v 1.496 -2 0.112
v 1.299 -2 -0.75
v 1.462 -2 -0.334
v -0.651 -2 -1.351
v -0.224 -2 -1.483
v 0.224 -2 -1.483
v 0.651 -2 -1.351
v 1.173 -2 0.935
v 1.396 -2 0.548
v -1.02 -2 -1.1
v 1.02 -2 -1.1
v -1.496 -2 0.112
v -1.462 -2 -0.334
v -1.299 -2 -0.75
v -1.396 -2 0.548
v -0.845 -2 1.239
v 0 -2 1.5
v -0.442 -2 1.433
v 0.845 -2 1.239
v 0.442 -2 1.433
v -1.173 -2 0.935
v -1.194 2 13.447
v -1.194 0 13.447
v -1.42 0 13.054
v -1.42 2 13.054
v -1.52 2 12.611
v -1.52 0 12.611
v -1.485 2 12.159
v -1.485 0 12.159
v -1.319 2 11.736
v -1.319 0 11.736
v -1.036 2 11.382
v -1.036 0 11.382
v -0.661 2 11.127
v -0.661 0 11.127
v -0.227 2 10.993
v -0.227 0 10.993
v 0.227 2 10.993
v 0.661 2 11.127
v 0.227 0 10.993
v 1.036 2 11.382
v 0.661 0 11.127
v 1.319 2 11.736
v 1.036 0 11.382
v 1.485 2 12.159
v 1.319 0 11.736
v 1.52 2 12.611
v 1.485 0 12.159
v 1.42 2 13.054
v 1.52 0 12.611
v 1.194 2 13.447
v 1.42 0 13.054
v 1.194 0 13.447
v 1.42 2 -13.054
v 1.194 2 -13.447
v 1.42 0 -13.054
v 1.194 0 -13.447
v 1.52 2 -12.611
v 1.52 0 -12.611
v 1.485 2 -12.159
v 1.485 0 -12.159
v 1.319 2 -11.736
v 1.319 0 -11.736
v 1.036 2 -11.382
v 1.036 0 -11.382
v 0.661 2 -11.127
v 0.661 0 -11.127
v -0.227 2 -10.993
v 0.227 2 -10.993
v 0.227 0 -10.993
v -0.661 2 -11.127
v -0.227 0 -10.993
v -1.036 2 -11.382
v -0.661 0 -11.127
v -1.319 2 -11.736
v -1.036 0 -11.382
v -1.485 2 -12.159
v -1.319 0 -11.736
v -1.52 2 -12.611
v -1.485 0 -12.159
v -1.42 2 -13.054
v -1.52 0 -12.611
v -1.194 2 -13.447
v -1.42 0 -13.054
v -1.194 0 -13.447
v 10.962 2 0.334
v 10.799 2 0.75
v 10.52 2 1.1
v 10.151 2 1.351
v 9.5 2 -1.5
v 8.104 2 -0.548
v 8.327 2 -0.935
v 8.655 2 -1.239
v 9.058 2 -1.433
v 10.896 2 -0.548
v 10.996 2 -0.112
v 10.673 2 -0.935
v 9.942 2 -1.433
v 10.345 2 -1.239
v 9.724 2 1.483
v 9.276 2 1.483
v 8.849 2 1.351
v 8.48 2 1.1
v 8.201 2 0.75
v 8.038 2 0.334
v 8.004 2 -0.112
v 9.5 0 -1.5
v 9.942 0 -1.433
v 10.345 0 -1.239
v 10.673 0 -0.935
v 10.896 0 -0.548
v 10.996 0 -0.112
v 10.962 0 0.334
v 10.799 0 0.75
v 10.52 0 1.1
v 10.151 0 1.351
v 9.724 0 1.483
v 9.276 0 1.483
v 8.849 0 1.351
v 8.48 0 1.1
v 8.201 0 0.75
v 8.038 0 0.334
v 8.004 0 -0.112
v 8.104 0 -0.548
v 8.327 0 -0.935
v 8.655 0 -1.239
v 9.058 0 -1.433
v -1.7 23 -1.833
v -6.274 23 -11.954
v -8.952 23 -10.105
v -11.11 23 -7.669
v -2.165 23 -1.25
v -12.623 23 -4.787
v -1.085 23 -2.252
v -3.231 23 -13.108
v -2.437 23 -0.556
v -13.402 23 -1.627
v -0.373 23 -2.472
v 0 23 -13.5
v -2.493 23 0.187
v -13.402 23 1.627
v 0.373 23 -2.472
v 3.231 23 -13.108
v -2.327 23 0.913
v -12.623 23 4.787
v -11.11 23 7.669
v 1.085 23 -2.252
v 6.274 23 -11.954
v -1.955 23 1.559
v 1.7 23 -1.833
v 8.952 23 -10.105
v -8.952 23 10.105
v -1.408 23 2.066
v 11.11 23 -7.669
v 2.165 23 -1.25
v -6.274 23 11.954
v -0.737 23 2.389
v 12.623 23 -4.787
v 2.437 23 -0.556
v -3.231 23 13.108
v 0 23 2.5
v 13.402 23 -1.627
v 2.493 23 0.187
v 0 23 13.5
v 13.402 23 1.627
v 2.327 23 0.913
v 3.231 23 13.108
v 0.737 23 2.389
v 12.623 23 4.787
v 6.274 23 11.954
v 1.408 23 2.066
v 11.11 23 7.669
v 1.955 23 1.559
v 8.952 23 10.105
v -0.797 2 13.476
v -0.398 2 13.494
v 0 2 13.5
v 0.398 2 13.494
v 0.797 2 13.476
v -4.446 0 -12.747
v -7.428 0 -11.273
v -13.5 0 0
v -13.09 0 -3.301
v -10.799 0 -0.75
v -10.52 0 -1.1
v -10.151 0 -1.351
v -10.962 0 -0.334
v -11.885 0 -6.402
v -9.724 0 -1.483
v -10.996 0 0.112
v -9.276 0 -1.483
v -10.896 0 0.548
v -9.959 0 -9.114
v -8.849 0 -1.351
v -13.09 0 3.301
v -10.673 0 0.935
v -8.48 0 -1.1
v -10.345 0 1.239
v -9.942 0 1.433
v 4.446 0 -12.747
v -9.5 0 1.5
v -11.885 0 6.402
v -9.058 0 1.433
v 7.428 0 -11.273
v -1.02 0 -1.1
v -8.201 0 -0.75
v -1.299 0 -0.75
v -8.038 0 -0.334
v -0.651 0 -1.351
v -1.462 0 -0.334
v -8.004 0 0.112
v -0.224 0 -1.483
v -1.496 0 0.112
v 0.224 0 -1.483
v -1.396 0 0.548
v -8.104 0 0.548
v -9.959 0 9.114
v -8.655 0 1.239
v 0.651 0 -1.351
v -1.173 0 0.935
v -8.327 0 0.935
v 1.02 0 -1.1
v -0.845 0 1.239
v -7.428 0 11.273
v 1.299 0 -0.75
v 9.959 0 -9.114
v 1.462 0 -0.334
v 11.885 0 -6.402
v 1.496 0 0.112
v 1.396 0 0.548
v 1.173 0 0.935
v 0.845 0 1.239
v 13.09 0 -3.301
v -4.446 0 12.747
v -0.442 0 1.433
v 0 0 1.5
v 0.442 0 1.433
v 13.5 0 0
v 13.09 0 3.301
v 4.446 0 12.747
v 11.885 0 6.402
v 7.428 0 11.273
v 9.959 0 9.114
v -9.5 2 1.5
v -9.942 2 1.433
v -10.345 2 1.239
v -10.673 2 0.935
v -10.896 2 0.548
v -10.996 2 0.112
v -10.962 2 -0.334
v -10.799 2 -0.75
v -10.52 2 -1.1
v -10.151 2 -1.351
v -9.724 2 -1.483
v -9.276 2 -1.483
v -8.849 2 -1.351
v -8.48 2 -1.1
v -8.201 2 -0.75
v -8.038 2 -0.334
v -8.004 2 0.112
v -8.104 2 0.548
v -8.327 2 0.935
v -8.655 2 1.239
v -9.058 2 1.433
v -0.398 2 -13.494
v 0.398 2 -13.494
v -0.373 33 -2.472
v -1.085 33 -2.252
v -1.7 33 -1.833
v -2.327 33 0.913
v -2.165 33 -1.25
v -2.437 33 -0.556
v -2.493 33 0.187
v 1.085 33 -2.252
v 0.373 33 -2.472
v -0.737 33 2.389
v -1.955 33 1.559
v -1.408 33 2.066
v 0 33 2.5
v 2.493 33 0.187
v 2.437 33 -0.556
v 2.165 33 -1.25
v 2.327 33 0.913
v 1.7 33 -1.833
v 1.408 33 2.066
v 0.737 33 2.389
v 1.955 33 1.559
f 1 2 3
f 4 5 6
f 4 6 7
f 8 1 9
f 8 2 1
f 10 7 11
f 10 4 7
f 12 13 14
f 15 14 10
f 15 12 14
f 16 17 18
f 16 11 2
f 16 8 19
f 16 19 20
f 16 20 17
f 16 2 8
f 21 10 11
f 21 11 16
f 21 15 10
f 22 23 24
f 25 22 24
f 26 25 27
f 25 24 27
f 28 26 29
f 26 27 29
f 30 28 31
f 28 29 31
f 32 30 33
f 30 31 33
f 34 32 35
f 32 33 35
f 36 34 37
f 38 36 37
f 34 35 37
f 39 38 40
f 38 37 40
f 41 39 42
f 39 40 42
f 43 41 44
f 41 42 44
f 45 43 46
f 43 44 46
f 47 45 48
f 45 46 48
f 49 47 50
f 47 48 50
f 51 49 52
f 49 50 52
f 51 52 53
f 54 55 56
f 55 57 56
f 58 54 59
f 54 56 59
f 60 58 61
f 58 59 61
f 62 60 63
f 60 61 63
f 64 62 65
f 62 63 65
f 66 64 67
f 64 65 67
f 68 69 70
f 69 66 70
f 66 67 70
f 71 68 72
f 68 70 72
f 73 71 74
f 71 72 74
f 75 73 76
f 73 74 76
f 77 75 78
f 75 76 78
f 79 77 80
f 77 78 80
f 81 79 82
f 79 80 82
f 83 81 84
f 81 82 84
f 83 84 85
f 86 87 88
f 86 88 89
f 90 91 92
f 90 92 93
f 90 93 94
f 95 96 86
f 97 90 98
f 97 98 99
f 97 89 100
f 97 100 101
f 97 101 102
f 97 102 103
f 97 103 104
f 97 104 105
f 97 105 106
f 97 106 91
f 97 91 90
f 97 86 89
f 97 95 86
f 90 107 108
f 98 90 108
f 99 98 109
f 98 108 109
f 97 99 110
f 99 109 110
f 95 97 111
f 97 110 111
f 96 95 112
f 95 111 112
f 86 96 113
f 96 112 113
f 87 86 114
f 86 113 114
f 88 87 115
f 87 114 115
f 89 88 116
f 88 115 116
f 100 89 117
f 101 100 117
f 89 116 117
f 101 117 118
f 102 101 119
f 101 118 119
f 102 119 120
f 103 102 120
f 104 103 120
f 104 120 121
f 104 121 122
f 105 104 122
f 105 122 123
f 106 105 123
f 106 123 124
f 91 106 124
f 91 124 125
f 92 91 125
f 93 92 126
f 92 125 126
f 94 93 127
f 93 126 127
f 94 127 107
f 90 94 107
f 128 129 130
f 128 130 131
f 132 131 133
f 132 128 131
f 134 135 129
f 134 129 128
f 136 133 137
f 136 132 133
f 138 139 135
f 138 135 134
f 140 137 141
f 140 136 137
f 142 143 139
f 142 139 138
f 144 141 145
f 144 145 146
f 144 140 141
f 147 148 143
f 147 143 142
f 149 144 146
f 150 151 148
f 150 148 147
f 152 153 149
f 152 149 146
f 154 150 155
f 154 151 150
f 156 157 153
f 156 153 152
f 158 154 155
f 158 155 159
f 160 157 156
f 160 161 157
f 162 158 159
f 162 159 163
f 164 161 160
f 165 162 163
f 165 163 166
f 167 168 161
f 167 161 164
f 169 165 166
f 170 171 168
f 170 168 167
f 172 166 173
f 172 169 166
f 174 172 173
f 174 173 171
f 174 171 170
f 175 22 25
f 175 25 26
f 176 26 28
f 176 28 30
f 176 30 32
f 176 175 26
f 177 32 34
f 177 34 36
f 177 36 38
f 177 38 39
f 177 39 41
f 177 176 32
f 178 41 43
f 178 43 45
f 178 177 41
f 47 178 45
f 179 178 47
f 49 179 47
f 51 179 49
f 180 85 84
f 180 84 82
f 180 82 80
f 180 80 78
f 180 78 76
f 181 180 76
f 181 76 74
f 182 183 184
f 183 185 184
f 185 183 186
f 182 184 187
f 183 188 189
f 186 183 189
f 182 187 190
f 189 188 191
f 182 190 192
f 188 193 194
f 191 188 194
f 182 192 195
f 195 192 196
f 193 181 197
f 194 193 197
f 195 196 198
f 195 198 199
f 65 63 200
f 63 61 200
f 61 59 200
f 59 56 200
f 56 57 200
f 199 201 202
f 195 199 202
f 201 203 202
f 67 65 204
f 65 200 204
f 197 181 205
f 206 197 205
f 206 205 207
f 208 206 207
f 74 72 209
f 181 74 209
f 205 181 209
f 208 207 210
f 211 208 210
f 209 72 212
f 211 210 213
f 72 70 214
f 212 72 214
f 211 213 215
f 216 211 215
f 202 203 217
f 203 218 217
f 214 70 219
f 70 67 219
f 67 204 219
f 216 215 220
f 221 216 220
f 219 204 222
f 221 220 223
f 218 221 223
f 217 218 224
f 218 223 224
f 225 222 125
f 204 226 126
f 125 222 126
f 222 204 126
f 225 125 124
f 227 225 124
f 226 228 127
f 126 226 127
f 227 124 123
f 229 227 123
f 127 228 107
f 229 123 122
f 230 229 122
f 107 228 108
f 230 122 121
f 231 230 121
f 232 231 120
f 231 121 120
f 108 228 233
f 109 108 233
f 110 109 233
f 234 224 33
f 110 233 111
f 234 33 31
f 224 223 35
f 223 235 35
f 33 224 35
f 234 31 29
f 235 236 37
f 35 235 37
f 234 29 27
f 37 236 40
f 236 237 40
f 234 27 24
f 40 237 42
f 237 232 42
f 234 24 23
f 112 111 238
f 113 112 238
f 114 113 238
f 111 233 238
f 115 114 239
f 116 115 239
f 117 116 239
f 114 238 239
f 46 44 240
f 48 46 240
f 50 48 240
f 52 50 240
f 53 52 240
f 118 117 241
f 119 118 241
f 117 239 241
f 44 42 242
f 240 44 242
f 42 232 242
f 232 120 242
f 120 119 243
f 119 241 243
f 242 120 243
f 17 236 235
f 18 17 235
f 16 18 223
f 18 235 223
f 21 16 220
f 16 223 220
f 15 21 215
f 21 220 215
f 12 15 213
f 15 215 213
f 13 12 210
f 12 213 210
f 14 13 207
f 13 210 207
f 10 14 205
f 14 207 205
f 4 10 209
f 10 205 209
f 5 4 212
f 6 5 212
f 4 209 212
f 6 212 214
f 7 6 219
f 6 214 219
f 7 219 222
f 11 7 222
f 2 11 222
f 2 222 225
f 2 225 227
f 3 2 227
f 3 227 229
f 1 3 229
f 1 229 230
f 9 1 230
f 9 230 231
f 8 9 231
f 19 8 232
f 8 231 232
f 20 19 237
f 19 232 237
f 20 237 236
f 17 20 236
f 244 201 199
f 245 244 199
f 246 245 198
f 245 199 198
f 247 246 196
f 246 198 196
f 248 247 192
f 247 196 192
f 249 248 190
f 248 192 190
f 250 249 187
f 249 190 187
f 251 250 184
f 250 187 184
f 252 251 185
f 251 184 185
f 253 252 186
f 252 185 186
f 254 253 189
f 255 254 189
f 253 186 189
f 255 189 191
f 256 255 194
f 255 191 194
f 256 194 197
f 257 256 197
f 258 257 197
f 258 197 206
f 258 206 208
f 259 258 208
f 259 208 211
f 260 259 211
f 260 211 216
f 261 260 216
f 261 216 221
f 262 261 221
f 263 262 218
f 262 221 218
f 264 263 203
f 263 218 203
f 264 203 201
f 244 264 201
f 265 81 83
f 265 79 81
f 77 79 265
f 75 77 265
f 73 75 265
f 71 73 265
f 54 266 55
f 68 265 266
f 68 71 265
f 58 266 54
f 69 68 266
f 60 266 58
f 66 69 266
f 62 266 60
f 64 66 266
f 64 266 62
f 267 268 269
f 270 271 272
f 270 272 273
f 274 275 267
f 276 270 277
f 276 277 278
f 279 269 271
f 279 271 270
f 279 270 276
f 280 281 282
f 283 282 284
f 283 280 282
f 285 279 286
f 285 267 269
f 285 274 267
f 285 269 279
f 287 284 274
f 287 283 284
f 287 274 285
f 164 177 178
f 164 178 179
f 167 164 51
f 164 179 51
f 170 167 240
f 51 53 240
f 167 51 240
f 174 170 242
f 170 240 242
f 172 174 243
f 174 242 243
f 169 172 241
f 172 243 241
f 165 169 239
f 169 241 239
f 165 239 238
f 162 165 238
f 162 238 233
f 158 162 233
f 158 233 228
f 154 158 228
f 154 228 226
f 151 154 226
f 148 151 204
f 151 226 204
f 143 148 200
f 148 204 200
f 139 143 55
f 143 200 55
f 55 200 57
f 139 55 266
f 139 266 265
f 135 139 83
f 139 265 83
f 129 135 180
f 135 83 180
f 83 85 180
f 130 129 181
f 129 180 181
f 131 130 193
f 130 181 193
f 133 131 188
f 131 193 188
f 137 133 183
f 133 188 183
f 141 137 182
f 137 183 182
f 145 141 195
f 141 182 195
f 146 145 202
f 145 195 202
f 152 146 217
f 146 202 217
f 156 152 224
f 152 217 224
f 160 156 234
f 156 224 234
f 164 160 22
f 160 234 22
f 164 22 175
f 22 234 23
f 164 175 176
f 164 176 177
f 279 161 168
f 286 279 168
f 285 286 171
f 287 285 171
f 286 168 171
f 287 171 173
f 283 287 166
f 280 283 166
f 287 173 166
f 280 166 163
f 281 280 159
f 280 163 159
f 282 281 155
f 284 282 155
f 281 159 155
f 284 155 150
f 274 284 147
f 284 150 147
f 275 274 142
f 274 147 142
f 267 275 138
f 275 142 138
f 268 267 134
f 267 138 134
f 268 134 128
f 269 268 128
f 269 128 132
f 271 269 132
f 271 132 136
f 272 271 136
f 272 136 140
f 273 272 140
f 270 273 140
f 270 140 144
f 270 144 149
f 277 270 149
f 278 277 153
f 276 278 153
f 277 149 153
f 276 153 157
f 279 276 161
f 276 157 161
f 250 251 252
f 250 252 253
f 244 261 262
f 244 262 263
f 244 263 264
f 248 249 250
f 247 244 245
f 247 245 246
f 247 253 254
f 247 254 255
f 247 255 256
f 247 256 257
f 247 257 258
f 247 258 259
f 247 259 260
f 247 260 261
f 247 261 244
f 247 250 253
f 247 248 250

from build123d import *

# Parameters (mm, degrees)
SKETCH1_R           = 13.499973
BOSS_EXTRUDE1_DEPTH = 23.0000048
SKETCH2_R           = 2.5
BOSS_EXTRUDE2_DEPTH = 10
SKETCH3_R           = 1.499997
BOSS_EXTRUDE3_DEPTH = 2
SKETCH4_R           = 1.524
SKETCH4_R_2         = 1.5
CUT_EXTRUDE1_DEPTH  = 2


with BuildPart() as part:
    # Sketch1 → Boss-Extrude1 (new body)
    with BuildSketch(Plane(origin=(0, 0, 0), x_dir=(1, 0, 0), z_dir=(0, 1, 0))):
        with Locations(Location((0, 0, 0), (0, 0, 270))):
            Circle(SKETCH1_R)
    extrude(amount=BOSS_EXTRUDE1_DEPTH)

    # Sketch2 → Boss-Extrude2 (add)
    with BuildSketch(Plane(origin=(0, 23.0000048, 0), x_dir=(1, 0, 0), z_dir=(0, 1, 0))):
        with Locations(Location((0, 0, 0), (0, 0, 270))):
            Circle(SKETCH2_R)
    extrude(amount=BOSS_EXTRUDE2_DEPTH)

    # Sketch3 → Boss-Extrude3 (add)
    with BuildSketch(Plane.XZ):
        with Locations(Location((0, 0, 0), (0, 0, 90))):
            Circle(SKETCH3_R)
    extrude(amount=BOSS_EXTRUDE3_DEPTH)

    # Sketch4 → Cut-Extrude1 (cut)
    with BuildSketch(Plane.XZ):
        with Locations((0, 12.5000004)):
            Circle(SKETCH4_R)
        with Locations(Location((9.4999937, 0, 0), (0, 0, 270))):
            Circle(SKETCH4_R_2)
        with Locations(Location((-9.4999937, 0, 0), (0, 0, 90))):
            Circle(SKETCH4_R_2)
        with Locations((0, -12.5000004)):
            Circle(SKETCH4_R)
    extrude(amount=-CUT_EXTRUDE1_DEPTH, mode=Mode.SUBTRACT)


solid = part.part
